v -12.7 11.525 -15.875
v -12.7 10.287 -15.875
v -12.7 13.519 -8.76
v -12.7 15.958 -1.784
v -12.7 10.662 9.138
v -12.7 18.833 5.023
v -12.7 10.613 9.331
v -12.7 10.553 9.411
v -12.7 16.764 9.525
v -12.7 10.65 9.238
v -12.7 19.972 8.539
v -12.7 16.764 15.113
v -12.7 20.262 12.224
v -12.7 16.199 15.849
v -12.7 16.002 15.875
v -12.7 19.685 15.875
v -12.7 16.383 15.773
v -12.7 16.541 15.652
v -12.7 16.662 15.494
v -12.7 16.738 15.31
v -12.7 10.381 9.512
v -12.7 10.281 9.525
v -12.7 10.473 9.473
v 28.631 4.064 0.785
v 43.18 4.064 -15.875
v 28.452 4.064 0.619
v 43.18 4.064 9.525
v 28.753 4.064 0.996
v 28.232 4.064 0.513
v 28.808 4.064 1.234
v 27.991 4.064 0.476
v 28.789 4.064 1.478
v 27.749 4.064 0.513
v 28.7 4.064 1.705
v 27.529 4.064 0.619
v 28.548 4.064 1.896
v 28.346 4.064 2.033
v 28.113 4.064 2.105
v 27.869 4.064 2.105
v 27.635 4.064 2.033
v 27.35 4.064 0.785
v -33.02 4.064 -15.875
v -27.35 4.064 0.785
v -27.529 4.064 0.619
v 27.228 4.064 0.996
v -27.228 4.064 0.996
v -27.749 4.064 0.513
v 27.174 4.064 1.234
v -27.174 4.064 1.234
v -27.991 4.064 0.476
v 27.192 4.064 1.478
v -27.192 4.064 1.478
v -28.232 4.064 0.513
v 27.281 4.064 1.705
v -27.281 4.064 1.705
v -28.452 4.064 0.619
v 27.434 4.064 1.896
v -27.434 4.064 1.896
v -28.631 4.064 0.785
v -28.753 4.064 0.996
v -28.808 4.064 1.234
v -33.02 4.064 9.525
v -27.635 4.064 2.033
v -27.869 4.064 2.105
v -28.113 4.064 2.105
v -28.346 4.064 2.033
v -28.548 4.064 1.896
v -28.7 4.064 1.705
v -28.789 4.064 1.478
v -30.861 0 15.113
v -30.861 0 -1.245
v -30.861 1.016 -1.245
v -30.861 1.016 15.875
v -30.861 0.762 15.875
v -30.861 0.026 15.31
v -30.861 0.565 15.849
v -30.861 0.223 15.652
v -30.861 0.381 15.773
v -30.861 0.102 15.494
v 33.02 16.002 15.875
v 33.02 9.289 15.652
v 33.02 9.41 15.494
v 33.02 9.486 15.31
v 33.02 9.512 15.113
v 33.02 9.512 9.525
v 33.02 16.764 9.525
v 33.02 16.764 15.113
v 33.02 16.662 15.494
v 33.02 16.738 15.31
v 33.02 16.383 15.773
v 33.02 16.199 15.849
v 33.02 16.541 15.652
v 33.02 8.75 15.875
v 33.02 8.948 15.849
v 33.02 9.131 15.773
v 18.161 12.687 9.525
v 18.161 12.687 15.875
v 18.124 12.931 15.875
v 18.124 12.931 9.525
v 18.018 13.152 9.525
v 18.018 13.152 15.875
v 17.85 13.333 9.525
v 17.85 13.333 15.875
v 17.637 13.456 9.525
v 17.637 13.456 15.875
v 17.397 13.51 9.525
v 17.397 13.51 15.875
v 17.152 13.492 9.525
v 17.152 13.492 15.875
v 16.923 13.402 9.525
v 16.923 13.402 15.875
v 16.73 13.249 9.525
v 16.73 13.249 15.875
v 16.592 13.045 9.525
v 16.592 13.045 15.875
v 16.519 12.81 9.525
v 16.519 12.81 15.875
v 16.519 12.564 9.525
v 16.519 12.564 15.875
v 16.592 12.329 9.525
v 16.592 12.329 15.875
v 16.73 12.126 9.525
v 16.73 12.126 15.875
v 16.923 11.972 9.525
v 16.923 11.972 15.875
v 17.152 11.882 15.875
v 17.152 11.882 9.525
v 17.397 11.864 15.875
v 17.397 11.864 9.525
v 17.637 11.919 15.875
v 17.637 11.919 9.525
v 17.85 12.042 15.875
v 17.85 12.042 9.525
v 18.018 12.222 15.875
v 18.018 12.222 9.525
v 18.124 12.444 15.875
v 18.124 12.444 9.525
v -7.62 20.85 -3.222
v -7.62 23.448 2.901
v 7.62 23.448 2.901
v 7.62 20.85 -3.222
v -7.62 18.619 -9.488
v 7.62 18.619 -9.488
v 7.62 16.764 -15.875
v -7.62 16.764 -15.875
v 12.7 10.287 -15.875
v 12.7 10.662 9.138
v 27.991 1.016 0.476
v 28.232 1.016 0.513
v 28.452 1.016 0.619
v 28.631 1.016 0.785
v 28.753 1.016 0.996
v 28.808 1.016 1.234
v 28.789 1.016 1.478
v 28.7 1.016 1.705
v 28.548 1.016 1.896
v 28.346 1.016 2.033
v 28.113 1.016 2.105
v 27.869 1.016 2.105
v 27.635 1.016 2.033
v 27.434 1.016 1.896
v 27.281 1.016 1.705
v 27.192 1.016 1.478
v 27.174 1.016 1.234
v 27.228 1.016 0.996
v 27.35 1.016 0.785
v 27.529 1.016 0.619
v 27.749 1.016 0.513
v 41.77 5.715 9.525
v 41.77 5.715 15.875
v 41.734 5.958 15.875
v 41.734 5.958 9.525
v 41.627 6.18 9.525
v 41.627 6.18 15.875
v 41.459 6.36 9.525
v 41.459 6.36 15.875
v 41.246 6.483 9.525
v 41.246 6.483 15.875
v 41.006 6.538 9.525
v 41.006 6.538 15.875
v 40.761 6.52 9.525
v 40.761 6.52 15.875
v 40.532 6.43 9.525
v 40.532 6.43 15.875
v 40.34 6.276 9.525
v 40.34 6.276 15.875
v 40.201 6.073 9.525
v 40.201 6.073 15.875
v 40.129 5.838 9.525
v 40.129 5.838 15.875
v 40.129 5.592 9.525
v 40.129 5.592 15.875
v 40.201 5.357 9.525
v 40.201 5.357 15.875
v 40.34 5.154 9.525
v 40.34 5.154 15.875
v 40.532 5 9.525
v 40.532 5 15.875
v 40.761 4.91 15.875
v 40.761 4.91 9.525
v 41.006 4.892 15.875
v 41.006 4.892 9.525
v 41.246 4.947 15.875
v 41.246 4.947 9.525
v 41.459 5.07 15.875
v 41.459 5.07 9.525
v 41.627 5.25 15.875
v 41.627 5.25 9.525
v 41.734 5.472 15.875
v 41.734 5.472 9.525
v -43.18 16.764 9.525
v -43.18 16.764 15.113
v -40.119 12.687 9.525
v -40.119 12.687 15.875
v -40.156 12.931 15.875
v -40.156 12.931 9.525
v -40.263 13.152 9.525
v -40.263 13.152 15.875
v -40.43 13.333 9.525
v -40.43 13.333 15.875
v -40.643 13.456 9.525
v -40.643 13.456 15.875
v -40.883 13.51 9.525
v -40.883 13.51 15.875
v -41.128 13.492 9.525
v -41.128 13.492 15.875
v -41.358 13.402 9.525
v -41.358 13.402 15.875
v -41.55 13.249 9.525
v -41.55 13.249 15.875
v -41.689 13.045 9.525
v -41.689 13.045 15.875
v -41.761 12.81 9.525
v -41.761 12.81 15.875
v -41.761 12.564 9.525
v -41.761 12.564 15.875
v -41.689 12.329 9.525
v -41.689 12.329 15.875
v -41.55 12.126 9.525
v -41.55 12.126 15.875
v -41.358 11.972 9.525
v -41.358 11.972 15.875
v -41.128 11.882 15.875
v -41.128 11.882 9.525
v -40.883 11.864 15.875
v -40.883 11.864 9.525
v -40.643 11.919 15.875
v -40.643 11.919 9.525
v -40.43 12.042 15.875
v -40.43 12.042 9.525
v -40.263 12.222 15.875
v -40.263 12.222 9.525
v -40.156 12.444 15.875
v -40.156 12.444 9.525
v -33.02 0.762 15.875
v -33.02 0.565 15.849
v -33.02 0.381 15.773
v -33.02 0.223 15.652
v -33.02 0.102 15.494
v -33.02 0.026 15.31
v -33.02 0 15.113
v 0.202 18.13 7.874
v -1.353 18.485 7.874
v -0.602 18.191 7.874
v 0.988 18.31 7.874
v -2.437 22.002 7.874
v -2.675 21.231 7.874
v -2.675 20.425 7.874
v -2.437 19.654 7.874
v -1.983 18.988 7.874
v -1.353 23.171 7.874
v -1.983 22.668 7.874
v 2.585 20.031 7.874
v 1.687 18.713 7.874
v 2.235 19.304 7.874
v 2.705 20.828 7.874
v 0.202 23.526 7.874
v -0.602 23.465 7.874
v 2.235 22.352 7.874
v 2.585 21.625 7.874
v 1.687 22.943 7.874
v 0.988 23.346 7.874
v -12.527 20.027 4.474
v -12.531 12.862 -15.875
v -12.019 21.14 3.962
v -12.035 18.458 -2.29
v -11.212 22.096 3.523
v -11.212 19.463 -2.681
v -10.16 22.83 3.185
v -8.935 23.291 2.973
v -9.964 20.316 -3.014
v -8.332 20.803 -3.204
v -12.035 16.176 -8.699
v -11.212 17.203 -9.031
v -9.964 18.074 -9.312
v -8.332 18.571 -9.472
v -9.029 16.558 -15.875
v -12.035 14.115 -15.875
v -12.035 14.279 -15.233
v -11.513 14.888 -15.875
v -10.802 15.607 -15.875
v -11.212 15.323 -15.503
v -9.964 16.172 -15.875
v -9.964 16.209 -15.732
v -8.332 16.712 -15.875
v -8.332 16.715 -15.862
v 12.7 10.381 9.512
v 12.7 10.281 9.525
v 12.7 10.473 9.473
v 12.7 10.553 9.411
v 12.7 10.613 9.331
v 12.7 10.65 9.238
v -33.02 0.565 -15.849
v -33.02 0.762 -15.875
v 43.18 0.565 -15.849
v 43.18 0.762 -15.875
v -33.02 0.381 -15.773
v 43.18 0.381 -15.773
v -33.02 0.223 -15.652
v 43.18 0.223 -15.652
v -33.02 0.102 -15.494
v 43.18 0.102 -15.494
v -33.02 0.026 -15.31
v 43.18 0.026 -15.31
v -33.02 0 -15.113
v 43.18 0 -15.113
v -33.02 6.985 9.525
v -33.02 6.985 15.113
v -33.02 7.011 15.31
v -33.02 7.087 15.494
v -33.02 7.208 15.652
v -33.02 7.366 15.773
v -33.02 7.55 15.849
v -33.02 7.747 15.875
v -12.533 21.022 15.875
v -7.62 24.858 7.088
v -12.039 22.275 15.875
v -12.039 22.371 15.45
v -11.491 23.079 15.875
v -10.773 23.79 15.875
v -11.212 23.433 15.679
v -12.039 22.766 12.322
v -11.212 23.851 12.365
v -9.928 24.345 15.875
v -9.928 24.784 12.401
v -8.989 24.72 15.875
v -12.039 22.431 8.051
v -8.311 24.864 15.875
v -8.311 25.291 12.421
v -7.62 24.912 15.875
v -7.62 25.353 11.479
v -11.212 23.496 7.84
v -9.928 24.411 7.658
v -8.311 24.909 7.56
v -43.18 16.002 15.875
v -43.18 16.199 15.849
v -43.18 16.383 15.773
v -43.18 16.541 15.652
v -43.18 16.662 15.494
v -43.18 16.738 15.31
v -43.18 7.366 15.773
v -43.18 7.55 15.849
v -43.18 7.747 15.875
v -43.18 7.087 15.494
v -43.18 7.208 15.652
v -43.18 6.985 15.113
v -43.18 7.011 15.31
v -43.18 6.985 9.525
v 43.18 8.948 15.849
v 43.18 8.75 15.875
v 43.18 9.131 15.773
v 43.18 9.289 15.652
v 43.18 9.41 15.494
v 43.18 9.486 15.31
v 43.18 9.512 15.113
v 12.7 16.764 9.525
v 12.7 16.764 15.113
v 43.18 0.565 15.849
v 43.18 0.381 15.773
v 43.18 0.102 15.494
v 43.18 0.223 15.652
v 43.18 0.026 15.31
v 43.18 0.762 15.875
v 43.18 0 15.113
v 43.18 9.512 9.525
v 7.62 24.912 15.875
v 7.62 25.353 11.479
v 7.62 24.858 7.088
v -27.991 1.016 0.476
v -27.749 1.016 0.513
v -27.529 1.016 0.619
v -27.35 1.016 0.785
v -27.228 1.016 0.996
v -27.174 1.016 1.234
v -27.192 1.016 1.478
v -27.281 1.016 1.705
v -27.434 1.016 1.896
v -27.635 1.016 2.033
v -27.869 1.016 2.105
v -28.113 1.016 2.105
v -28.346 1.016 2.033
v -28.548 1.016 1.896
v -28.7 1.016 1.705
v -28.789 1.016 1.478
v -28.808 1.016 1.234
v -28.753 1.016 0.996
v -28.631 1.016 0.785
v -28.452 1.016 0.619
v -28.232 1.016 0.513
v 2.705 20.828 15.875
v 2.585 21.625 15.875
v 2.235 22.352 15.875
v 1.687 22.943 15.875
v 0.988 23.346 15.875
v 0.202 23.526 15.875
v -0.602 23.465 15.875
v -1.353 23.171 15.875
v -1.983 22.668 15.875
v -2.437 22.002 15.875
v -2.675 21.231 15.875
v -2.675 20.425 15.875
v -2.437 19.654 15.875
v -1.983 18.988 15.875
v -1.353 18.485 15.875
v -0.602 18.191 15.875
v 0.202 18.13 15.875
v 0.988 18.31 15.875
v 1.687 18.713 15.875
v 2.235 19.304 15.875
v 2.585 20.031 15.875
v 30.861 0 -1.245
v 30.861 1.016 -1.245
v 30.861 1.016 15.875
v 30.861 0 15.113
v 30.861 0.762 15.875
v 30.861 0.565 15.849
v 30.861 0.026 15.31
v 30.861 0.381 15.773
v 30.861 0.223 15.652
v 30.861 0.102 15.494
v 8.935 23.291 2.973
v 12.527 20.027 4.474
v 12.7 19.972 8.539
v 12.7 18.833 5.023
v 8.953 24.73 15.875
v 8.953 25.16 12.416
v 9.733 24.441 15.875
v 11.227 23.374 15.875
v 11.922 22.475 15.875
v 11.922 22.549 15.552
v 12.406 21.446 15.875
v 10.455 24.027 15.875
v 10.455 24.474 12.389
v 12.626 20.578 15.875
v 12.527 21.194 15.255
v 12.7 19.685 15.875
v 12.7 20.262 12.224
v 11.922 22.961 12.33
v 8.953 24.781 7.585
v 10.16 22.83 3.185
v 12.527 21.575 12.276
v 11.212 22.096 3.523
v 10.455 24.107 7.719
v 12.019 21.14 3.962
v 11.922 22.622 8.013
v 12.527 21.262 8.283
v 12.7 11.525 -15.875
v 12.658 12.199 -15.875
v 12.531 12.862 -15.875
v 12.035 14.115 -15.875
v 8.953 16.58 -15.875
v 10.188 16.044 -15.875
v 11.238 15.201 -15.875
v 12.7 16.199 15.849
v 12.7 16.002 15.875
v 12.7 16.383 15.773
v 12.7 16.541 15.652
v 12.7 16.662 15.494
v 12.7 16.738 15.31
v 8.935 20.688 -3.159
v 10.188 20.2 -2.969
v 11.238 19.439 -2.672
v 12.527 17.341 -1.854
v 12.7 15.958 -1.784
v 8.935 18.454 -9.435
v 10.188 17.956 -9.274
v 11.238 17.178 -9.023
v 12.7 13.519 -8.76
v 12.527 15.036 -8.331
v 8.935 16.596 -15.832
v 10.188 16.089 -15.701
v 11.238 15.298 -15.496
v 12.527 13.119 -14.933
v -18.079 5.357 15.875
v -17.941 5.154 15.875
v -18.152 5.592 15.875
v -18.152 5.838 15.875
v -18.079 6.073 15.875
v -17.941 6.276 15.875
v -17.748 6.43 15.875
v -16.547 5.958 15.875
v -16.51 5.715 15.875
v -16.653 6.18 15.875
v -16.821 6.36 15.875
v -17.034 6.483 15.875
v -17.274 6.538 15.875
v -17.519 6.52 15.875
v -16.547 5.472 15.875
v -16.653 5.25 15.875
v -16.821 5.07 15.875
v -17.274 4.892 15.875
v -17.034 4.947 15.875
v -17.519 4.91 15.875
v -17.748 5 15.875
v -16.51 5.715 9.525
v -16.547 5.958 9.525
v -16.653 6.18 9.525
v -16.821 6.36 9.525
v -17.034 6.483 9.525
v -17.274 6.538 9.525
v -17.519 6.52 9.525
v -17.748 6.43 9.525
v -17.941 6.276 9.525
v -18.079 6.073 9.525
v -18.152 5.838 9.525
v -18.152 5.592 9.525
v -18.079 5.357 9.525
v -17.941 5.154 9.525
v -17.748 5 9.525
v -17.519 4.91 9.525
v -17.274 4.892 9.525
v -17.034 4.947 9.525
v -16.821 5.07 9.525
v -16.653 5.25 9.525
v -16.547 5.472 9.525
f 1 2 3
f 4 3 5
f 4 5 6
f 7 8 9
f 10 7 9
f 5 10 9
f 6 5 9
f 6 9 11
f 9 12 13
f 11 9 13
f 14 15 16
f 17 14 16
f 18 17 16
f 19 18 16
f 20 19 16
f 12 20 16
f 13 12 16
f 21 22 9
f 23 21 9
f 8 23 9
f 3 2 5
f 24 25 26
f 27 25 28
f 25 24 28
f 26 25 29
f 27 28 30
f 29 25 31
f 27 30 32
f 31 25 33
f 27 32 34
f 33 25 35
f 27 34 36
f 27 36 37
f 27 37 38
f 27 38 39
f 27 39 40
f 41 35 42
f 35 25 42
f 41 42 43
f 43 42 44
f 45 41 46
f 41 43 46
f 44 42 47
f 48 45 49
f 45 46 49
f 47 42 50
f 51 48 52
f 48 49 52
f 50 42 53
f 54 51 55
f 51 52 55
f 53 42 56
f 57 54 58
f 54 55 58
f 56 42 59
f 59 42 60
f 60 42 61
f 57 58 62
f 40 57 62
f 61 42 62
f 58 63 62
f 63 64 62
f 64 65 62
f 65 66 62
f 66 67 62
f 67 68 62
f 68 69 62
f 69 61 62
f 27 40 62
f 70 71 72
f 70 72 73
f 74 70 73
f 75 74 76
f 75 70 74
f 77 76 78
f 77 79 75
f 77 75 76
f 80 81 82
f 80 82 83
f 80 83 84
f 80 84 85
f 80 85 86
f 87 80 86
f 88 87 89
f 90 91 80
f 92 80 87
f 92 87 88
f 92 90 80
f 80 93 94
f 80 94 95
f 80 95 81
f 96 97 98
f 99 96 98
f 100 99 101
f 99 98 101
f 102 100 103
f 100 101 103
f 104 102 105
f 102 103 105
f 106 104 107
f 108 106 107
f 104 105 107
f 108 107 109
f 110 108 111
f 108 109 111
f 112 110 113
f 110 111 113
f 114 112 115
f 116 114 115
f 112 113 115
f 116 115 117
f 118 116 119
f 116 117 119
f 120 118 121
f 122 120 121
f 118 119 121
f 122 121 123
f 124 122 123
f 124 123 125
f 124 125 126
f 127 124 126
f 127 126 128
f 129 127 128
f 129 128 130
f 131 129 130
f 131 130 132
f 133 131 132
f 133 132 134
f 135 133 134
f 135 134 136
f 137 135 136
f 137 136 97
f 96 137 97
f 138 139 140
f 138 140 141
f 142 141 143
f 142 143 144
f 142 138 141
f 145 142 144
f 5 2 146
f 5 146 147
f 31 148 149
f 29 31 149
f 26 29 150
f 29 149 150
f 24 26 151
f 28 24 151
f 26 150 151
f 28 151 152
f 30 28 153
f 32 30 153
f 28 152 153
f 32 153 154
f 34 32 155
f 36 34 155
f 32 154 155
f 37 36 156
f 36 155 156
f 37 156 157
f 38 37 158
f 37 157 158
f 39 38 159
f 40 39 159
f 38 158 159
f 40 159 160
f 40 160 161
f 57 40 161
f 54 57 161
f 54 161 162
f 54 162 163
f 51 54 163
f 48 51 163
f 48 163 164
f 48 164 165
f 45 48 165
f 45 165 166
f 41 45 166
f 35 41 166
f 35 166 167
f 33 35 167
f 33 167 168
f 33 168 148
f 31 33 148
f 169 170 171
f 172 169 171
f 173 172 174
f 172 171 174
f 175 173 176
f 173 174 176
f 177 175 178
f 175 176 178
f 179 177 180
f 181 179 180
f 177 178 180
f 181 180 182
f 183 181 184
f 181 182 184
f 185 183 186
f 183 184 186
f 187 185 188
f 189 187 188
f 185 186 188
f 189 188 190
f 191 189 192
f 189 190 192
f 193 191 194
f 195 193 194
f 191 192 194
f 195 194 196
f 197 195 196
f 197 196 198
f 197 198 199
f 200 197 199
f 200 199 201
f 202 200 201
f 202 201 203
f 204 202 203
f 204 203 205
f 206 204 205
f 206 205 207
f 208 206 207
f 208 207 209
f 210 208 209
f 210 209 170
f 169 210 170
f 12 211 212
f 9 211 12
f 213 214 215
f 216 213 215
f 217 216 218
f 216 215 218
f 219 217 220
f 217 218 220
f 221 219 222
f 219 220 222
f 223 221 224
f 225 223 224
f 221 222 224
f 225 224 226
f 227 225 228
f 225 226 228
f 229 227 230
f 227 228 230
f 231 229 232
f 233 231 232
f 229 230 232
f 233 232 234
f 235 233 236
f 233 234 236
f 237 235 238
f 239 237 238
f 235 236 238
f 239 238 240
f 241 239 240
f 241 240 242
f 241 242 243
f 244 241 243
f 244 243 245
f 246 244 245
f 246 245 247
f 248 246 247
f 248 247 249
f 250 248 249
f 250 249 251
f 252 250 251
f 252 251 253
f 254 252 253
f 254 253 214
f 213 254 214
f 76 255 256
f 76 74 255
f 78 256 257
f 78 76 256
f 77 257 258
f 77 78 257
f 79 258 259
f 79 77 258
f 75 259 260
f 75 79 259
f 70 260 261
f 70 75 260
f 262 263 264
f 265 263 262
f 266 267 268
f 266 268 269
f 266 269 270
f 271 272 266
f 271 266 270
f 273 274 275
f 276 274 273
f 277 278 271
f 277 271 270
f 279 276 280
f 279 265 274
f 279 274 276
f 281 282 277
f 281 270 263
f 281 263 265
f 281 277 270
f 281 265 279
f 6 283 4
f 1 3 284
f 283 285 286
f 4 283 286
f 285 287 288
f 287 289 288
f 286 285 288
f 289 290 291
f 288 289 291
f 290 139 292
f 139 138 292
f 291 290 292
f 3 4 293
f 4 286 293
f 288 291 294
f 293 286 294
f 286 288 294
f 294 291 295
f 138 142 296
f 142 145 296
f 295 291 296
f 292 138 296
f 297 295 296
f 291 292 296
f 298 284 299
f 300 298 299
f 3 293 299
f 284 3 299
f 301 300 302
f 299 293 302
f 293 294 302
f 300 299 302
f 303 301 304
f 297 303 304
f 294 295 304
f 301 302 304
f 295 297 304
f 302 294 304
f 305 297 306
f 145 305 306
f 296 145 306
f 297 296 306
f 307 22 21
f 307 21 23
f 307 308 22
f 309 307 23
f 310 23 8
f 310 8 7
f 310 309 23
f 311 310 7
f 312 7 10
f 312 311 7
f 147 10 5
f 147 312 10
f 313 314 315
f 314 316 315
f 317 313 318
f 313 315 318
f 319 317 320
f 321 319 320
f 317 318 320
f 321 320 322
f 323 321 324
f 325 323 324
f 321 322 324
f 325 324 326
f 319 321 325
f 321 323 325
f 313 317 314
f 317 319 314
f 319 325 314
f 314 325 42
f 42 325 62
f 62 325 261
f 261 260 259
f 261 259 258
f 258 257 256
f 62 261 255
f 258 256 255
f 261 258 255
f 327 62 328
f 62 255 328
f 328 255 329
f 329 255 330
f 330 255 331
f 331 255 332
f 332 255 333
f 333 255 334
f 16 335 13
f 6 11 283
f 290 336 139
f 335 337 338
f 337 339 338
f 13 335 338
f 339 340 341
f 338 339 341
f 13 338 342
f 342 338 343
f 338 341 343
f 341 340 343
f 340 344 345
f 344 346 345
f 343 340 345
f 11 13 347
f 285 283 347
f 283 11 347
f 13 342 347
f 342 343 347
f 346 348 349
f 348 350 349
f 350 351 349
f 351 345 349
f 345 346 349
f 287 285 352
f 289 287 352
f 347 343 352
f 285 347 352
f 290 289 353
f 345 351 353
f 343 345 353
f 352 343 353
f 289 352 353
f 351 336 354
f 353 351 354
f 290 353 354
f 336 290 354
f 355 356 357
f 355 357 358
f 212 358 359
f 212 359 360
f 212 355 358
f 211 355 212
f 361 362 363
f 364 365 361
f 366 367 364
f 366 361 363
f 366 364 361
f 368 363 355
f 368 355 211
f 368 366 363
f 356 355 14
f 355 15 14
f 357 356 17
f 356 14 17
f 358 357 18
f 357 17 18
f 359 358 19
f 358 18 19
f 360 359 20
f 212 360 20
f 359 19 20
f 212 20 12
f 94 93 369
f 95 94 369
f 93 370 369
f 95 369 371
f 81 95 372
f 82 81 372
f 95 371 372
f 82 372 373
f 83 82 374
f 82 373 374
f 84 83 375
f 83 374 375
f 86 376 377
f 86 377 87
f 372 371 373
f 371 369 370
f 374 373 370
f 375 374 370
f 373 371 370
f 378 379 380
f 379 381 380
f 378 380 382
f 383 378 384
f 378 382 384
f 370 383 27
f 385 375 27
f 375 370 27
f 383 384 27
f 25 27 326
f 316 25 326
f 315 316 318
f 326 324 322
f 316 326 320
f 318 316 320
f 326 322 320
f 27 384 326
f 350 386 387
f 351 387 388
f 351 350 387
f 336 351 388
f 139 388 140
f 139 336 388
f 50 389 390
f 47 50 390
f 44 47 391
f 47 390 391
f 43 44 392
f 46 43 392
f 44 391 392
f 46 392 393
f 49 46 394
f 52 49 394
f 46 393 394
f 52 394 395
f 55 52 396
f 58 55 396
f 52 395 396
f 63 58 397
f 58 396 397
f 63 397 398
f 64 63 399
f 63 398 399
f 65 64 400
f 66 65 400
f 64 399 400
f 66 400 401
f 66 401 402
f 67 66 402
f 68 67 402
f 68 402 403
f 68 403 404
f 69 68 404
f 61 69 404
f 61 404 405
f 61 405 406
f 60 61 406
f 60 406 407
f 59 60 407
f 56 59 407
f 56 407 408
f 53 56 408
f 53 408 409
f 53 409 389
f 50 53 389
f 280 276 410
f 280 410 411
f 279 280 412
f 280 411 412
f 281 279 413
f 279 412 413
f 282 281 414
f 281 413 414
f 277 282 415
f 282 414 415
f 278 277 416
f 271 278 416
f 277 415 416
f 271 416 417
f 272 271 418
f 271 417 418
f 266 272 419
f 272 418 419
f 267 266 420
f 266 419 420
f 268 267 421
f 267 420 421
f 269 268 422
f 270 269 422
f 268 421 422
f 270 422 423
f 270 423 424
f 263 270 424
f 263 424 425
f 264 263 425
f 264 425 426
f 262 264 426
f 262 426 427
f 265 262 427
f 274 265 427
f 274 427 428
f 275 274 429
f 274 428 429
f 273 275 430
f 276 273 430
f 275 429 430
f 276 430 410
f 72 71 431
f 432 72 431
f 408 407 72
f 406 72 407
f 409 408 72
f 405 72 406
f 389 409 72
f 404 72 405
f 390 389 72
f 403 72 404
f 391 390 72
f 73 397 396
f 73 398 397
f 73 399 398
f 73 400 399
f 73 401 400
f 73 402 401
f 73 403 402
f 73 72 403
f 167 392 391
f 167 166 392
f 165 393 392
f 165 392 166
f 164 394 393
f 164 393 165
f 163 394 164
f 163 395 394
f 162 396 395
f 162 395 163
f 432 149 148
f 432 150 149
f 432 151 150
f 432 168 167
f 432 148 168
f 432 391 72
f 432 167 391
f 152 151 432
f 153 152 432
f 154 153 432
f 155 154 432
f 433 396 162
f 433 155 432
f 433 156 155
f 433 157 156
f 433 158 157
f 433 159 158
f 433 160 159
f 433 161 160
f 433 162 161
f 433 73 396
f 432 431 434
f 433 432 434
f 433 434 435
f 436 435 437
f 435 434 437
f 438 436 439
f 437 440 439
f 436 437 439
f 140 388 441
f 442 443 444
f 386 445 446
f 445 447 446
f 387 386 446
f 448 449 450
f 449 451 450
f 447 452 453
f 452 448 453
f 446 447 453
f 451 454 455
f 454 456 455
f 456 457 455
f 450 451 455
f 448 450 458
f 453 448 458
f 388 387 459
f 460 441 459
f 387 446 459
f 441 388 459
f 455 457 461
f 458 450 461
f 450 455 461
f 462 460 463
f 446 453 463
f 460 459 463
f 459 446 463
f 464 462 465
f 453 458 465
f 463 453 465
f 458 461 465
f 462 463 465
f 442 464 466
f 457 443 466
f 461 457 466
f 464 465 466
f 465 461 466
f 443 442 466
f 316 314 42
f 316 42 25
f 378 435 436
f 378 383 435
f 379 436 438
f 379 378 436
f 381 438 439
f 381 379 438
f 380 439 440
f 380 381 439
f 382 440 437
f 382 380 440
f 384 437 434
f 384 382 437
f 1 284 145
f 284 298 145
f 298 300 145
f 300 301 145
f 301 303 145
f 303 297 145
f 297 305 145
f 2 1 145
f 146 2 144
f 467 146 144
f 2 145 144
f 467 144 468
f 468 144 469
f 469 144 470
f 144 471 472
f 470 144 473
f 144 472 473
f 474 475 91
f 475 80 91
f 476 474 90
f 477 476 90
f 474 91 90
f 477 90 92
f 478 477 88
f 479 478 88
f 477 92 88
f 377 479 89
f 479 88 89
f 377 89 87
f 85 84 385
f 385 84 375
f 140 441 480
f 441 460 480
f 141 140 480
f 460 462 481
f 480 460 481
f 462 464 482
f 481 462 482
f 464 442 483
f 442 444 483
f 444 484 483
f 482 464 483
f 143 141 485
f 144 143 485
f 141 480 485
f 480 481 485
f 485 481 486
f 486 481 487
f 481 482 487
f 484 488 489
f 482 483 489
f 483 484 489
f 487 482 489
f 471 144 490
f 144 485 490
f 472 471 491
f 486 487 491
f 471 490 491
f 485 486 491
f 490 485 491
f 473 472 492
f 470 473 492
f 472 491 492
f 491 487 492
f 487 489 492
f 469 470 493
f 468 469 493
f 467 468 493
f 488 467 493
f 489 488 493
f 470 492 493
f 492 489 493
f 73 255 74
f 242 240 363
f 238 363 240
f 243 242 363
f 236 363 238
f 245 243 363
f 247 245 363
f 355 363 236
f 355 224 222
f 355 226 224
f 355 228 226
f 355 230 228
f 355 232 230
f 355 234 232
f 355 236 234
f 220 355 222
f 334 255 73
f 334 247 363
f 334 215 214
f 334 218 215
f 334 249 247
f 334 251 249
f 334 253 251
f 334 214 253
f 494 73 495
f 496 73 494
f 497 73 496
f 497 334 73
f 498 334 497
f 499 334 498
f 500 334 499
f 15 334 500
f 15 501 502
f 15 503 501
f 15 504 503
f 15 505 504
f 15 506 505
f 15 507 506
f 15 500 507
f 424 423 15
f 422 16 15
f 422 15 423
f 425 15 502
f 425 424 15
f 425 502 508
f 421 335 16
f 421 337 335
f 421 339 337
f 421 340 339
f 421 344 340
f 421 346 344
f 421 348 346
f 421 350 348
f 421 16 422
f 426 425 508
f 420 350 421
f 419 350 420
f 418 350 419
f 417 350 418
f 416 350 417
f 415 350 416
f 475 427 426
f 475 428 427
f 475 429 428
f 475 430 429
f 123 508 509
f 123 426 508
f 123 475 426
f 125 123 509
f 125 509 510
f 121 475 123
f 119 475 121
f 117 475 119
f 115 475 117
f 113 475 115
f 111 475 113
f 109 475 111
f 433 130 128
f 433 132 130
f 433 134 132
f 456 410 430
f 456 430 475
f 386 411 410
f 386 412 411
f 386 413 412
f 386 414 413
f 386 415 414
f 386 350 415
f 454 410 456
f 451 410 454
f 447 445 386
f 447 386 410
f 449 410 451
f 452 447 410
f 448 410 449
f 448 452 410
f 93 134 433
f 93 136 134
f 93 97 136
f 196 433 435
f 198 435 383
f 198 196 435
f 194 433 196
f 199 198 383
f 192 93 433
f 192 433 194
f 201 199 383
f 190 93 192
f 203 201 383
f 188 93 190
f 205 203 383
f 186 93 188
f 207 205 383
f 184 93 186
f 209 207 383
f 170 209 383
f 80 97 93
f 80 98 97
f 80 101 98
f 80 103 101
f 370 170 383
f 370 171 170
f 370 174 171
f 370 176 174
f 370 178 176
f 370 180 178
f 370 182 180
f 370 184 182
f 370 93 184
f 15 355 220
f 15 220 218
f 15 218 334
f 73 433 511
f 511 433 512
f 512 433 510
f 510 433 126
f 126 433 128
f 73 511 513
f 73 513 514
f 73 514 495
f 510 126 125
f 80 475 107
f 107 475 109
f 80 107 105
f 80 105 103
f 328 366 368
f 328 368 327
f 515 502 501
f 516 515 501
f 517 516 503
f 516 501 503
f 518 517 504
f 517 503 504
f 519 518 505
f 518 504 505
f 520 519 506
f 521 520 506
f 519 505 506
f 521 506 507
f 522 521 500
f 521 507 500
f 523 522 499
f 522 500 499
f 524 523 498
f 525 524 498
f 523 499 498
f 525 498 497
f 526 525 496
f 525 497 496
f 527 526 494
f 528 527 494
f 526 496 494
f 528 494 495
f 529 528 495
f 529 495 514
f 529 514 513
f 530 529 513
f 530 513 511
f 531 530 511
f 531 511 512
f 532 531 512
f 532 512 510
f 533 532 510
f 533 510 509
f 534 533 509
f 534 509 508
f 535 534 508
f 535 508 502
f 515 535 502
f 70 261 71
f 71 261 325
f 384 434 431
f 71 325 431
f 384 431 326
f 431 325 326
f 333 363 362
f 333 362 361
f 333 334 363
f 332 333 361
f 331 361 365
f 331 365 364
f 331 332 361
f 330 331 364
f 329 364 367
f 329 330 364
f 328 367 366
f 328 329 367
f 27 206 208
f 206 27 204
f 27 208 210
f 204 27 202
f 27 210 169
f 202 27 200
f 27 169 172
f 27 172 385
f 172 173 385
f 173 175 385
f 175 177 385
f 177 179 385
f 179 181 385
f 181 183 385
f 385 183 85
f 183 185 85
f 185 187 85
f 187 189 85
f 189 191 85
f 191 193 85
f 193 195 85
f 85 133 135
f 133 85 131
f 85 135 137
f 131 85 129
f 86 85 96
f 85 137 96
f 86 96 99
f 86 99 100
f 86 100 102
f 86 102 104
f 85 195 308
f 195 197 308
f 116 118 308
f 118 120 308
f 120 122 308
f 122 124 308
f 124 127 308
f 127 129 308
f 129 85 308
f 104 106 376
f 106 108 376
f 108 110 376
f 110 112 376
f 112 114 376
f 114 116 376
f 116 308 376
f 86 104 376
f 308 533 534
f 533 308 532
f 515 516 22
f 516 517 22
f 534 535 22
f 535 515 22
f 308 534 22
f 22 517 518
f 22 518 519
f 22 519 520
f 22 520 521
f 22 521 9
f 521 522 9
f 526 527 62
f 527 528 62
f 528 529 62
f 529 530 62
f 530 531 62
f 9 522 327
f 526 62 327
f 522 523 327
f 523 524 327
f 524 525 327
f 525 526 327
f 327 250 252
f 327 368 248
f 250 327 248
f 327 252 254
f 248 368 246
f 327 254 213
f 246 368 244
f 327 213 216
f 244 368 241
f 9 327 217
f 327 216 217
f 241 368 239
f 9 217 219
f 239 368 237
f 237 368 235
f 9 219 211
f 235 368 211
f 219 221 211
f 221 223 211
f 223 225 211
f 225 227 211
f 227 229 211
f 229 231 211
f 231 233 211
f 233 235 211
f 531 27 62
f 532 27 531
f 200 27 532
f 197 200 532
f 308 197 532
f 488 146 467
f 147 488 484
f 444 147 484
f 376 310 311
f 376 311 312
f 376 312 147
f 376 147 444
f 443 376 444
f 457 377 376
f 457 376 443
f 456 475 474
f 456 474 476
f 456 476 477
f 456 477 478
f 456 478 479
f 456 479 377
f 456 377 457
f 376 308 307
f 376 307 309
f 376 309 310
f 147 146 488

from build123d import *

# Parameters (mm, degrees)
SKETCH1_W           = 86.36
SKETCH1_H           = 31.75
BOSS_EXTRUDE1_DEPTH = 16.764
SKETCH2_W           = 25.4
SKETCH2_H           = 6.35
CUT_EXTRUDE1_DEPTH  = 86.36
SKETCH3_W           = 25.4
SKETCH3_H           = 6.35
CUT_EXTRUDE2_DEPTH  = 50.8
SKETCH5_W           = 61.722
SKETCH5_H           = 17.1196
CUT_EXTRUDE3_DEPTH  = 1.016
SKETCH5_3_R         = 0.81915
CUT_EXTRUDE4_DEPTH  = 49.964882528
CUT_EXTRUDE8_REACH  = 58.157
SKETCH6_W           = 10.16
SKETCH6_H           = 5.08
SKETCH6_R           = 0.8255
SKETCH6_H_2         = 6.985
SKETCH6_H_3         = 2.1717
SKETCH7_W           = 25.4
SKETCH7_H           = 7.62
BOSS_EXTRUDE2_DEPTH = 25.4
CUT_EXTRUDE9_DEPTH  = 25.4
FILLET1_R           = 0.381
SKETCH11_W          = 25.4
SKETCH11_H          = 8.89
BOSS_EXTRUDE5_DEPTH = 31.75
FILLET2_R           = 0.762
CUT_EXTRUDE10_DEPTH = 25.4
FILLET4_R           = 5.08
SKETCH10_R          = 2.7051
CUT_EXTRUDE11_DEPTH = 8.001


with BuildPart() as part:
    # Sketch1 → Boss-Extrude1 (new body)
    with BuildSketch(Plane(origin=(0, 0, 0), x_dir=(1, 0, 0), z_dir=(0, 1, 0))):
        Rectangle(SKETCH1_W, SKETCH1_H)
    extrude(amount=BOSS_EXTRUDE1_DEPTH)

    # Sketch2 → Cut-Extrude1 (cut)
    with BuildSketch(Plane.ZY.offset(43.18)):
        with Locations((-3.175, 7.239)):
            Rectangle(SKETCH2_W, SKETCH2_H)
    extrude(amount=-CUT_EXTRUDE1_DEPTH, mode=Mode.SUBTRACT)

    # Sketch3 → Cut-Extrude2 (cut)
    with BuildSketch(Plane.ZY.offset(43.18)):
        with Locations((-3.175, 13.589)):
            Rectangle(SKETCH3_W, SKETCH3_H)
    cut_extrude2 = extrude(amount=-CUT_EXTRUDE2_DEPTH, mode=Mode.SUBTRACT)

    # Mirror1: Cut-Extrude2 across plane
    add(cut_extrude2.mirror(Plane(origin=(0, 0, 0), x_dir=(0, 0, 1), z_dir=(1, 0, 0))), mode=Mode.SUBTRACT)

    # Sketch5 → Cut-Extrude3 (cut)
    with BuildSketch(Plane.XZ):
        with Locations((0, 7.3152)):
            Rectangle(SKETCH5_W, SKETCH5_H)
    extrude(amount=-CUT_EXTRUDE3_DEPTH, mode=Mode.SUBTRACT)

    # Sketch5<3> → Cut-Extrude4 (cut, through all)
    with BuildSketch(Plane.XZ):
        with Locations(Location((-27.9908, 1.2954, 0), (0, 0, 270))):
            Circle(SKETCH5_3_R)
        with Locations(Location((27.9908, 1.2954, 0), (0, 0, 270))):
            Circle(SKETCH5_3_R)
    extrude(amount=-CUT_EXTRUDE4_DEPTH, mode=Mode.SUBTRACT)

    # Cut-Extrude8: up to this face of the body (flat: up to its plane)
    cut_extrude8_end = Plane(part.part.faces().sort_by_distance((0, 2.032, -15.875))[0])
    # Sketch6 → Cut-Extrude8 (cut, up to the picked face)
    with BuildSketch(Plane.XY.offset(15.875), mode=Mode.PRIVATE) as cut_extrude8_sk1:
        with Locations((38.1, 12.0523)):
            Rectangle(SKETCH6_W, SKETCH6_H)
        with Locations((40.9448, 12.6873)):
            Circle(SKETCH6_R, mode=Mode.SUBTRACT)
    cut_extrude8_tool1 = split(extrude(cut_extrude8_sk1.sketch, amount=-CUT_EXTRUDE8_REACH, mode=Mode.PRIVATE), bisect_by=cut_extrude8_end, keep=Keep.BOTH, mode=Mode.PRIVATE)
    # Sketch6 → Cut-Extrude8 (cut, up to the picked face)
    with BuildSketch(Plane.XY.offset(15.875), mode=Mode.PRIVATE) as cut_extrude8_sk2:
        with Locations((40.9448, 12.6873)):
            Circle(SKETCH6_R)
    cut_extrude8_tool2 = split(extrude(cut_extrude8_sk2.sketch, amount=-CUT_EXTRUDE8_REACH, mode=Mode.PRIVATE), bisect_by=cut_extrude8_end, keep=Keep.BOTH, mode=Mode.PRIVATE)
    # Sketch6 → Cut-Extrude8 (cut, up to the picked face)
    with BuildSketch(Plane.XY.offset(15.875), mode=Mode.PRIVATE) as cut_extrude8_sk3:
        with Locations((17.3355, 12.6873)):
            Circle(SKETCH6_R)
    cut_extrude8_tool3 = split(extrude(cut_extrude8_sk3.sketch, amount=-CUT_EXTRUDE8_REACH, mode=Mode.PRIVATE), bisect_by=cut_extrude8_end, keep=Keep.BOTH, mode=Mode.PRIVATE)
    # Sketch6 → Cut-Extrude8 (cut, up to the picked face)
    with BuildSketch(Plane.XY.offset(15.875), mode=Mode.PRIVATE) as cut_extrude8_sk4:
        with Locations((40.9448, 5.715)):
            Circle(SKETCH6_R)
    cut_extrude8_tool4 = split(extrude(cut_extrude8_sk4.sketch, amount=-CUT_EXTRUDE8_REACH, mode=Mode.PRIVATE), bisect_by=cut_extrude8_end, keep=Keep.BOTH, mode=Mode.PRIVATE)
    # Sketch6 → Cut-Extrude8 (cut, up to the picked face)
    with BuildSketch(Plane.XY.offset(15.875), mode=Mode.PRIVATE) as cut_extrude8_sk5:
        with Locations((-38.1, 3.4925)):
            Rectangle(SKETCH6_W, SKETCH6_H_2)
        with Locations((-40.9448, 5.715)):
            Circle(SKETCH6_R, mode=Mode.SUBTRACT)
    cut_extrude8_tool5 = split(extrude(cut_extrude8_sk5.sketch, amount=-CUT_EXTRUDE8_REACH, mode=Mode.PRIVATE), bisect_by=cut_extrude8_end, keep=Keep.BOTH, mode=Mode.PRIVATE)
    # Sketch6 → Cut-Extrude8 (cut, up to the picked face)
    with BuildSketch(Plane.XY.offset(15.875), mode=Mode.PRIVATE) as cut_extrude8_sk6:
        with Locations((-40.9448, 5.715)):
            Circle(SKETCH6_R)
    cut_extrude8_tool6 = split(extrude(cut_extrude8_sk6.sketch, amount=-CUT_EXTRUDE8_REACH, mode=Mode.PRIVATE), bisect_by=cut_extrude8_end, keep=Keep.BOTH, mode=Mode.PRIVATE)
    # Sketch6 → Cut-Extrude8 (cut, up to the picked face)
    with BuildSketch(Plane.XY.offset(15.875), mode=Mode.PRIVATE) as cut_extrude8_sk7:
        with Locations((-17.3355, 5.715)):
            Circle(SKETCH6_R)
    cut_extrude8_tool7 = split(extrude(cut_extrude8_sk7.sketch, amount=-CUT_EXTRUDE8_REACH, mode=Mode.PRIVATE), bisect_by=cut_extrude8_end, keep=Keep.BOTH, mode=Mode.PRIVATE)
    # Sketch6 → Cut-Extrude8 (cut, up to the picked face)
    with BuildSketch(Plane.XY.offset(15.875), mode=Mode.PRIVATE) as cut_extrude8_sk8:
        with Locations((-40.9448, 12.6873)):
            Circle(SKETCH6_R)
    cut_extrude8_tool8 = split(extrude(cut_extrude8_sk8.sketch, amount=-CUT_EXTRUDE8_REACH, mode=Mode.PRIVATE), bisect_by=cut_extrude8_end, keep=Keep.BOTH, mode=Mode.PRIVATE)
    # Sketch6 → Cut-Extrude8 (cut, up to the picked face)
    with BuildSketch(Plane.XY.offset(15.875), mode=Mode.PRIVATE) as cut_extrude8_sk9:
        with Locations((38.1, 15.67815)):
            Rectangle(SKETCH6_W, SKETCH6_H_3)
    cut_extrude8_tool9 = split(extrude(cut_extrude8_sk9.sketch, amount=-CUT_EXTRUDE8_REACH, mode=Mode.PRIVATE), bisect_by=cut_extrude8_end, keep=Keep.BOTH, mode=Mode.PRIVATE)
    add(cut_extrude8_tool1.solids().sort_by(Axis((37.976895, 12.024821, 15.875), (0, 0, -1)))[0], mode=Mode.SUBTRACT)
    add(cut_extrude8_tool2.solids().sort_by(Axis((40.9448, 12.6873, 15.875), (0, 0, -1)))[0], mode=Mode.SUBTRACT)
    add(cut_extrude8_tool3.solids().sort_by(Axis((17.3355, 12.6873, 15.875), (0, 0, -1)))[0], mode=Mode.SUBTRACT)
    add(cut_extrude8_tool4.solids().sort_by(Axis((40.9448, 5.715, 15.875), (0, 0, -1)))[0], mode=Mode.SUBTRACT)
    add(cut_extrude8_tool5.solids().sort_by(Axis((-38.011513, 3.42337, 15.875), (0, 0, -1)))[0], mode=Mode.SUBTRACT)
    add(cut_extrude8_tool6.solids().sort_by(Axis((-40.9448, 5.715, 15.875), (0, 0, -1)))[0], mode=Mode.SUBTRACT)
    add(cut_extrude8_tool7.solids().sort_by(Axis((-17.3355, 5.715, 15.875), (0, 0, -1)))[0], mode=Mode.SUBTRACT)
    add(cut_extrude8_tool8.solids().sort_by(Axis((-40.9448, 12.6873, 15.875), (0, 0, -1)))[0], mode=Mode.SUBTRACT)
    add(cut_extrude8_tool9.solids().sort_by(Axis((38.1, 15.67815, 15.875), (0, 0, -1)))[0], mode=Mode.SUBTRACT)

    # Sketch7 → Boss-Extrude2 (add)
    with BuildSketch(Plane(origin=(0, 0, 9.525), x_dir=(-1, 0, 0), z_dir=(0, 0, -1))):
        with Locations((0, 12.954)):
            Rectangle(SKETCH7_W, SKETCH7_H)
    extrude(amount=BOSS_EXTRUDE2_DEPTH)

    # Sketch8 → Cut-Extrude9 (cut)
    with BuildSketch(Plane.ZY.offset(12.7)):
        Polygon((-15.875, 10.287), (9.525, 10.668), (9.525, 9.144), (-15.875, 9.144), align=None)
    extrude(amount=-CUT_EXTRUDE9_DEPTH, mode=Mode.SUBTRACT)

    # Fillet1
    fillet1_edges = [part.edges().sort_by_distance(p)[0] for p in [
        (0, 10.668, 9.525),
    ]]
    fillet(fillet1_edges, radius=FILLET1_R)

    # Sketch11 → Boss-Extrude5 (add)
    with BuildSketch(Plane.XY.offset(15.875)):
        with Locations((0, 21.209)):
            Rectangle(SKETCH11_W, SKETCH11_H)
    extrude(amount=-BOSS_EXTRUDE5_DEPTH)

    # Fillet2
    fillet2_edges = [part.edges().sort_by_distance(p)[0] for p in [
        (-31.9405, 0, 15.875),
        (-38.1, 6.985, 15.875),
        (38.1, 9.5123, 15.875),
        (-27.94, 16.764, 15.875),
        (22.86, 16.764, 15.875),
        (5.08, 0, -15.875),
        (37.0205, 0, 15.875),
    ]]
    fillet(fillet2_edges, radius=FILLET2_R)

    # Sketch12 → Cut-Extrude10 (cut)
    with BuildSketch(Plane.ZY.offset(12.7)):
        with BuildLine():
            Line((-15.875, 16.764), (-15.875, 25.654))
            Line((-15.875, 25.654), (15.875, 25.654))
            Line((15.875, 25.654), (15.875, 24.911939438))
            ThreePointArc((15.875, 24.911939438), (9.270292434, 25.222373256), (2.900847527, 23.447914815))
            ThreePointArc((2.900847527, 23.447914815), (-6.338198623, 19.687743912), (-15.875, 16.764))
        make_face()
    extrude(amount=-CUT_EXTRUDE10_DEPTH, mode=Mode.SUBTRACT)

    # Fillet4
    fillet4_edges = [part.edges().sort_by_distance(p)[0] for p in [
        (-12.7, 19.687743912, -6.338198623),
        (-12.7, 25.222373256, 9.270292434),
        (12.7, 19.687743912, -6.338198623),
        (12.7, 25.222373256, 9.270292434),
    ]]
    fillet(fillet4_edges, radius=FILLET4_R)

    # Sketch10 → Cut-Extrude11 (cut)
    with BuildSketch(Plane.XY.offset(15.875)):
        with Locations((0, 20.828)):
            Circle(SKETCH10_R)
    extrude(amount=-CUT_EXTRUDE11_DEPTH, mode=Mode.SUBTRACT)


solid = part.part
